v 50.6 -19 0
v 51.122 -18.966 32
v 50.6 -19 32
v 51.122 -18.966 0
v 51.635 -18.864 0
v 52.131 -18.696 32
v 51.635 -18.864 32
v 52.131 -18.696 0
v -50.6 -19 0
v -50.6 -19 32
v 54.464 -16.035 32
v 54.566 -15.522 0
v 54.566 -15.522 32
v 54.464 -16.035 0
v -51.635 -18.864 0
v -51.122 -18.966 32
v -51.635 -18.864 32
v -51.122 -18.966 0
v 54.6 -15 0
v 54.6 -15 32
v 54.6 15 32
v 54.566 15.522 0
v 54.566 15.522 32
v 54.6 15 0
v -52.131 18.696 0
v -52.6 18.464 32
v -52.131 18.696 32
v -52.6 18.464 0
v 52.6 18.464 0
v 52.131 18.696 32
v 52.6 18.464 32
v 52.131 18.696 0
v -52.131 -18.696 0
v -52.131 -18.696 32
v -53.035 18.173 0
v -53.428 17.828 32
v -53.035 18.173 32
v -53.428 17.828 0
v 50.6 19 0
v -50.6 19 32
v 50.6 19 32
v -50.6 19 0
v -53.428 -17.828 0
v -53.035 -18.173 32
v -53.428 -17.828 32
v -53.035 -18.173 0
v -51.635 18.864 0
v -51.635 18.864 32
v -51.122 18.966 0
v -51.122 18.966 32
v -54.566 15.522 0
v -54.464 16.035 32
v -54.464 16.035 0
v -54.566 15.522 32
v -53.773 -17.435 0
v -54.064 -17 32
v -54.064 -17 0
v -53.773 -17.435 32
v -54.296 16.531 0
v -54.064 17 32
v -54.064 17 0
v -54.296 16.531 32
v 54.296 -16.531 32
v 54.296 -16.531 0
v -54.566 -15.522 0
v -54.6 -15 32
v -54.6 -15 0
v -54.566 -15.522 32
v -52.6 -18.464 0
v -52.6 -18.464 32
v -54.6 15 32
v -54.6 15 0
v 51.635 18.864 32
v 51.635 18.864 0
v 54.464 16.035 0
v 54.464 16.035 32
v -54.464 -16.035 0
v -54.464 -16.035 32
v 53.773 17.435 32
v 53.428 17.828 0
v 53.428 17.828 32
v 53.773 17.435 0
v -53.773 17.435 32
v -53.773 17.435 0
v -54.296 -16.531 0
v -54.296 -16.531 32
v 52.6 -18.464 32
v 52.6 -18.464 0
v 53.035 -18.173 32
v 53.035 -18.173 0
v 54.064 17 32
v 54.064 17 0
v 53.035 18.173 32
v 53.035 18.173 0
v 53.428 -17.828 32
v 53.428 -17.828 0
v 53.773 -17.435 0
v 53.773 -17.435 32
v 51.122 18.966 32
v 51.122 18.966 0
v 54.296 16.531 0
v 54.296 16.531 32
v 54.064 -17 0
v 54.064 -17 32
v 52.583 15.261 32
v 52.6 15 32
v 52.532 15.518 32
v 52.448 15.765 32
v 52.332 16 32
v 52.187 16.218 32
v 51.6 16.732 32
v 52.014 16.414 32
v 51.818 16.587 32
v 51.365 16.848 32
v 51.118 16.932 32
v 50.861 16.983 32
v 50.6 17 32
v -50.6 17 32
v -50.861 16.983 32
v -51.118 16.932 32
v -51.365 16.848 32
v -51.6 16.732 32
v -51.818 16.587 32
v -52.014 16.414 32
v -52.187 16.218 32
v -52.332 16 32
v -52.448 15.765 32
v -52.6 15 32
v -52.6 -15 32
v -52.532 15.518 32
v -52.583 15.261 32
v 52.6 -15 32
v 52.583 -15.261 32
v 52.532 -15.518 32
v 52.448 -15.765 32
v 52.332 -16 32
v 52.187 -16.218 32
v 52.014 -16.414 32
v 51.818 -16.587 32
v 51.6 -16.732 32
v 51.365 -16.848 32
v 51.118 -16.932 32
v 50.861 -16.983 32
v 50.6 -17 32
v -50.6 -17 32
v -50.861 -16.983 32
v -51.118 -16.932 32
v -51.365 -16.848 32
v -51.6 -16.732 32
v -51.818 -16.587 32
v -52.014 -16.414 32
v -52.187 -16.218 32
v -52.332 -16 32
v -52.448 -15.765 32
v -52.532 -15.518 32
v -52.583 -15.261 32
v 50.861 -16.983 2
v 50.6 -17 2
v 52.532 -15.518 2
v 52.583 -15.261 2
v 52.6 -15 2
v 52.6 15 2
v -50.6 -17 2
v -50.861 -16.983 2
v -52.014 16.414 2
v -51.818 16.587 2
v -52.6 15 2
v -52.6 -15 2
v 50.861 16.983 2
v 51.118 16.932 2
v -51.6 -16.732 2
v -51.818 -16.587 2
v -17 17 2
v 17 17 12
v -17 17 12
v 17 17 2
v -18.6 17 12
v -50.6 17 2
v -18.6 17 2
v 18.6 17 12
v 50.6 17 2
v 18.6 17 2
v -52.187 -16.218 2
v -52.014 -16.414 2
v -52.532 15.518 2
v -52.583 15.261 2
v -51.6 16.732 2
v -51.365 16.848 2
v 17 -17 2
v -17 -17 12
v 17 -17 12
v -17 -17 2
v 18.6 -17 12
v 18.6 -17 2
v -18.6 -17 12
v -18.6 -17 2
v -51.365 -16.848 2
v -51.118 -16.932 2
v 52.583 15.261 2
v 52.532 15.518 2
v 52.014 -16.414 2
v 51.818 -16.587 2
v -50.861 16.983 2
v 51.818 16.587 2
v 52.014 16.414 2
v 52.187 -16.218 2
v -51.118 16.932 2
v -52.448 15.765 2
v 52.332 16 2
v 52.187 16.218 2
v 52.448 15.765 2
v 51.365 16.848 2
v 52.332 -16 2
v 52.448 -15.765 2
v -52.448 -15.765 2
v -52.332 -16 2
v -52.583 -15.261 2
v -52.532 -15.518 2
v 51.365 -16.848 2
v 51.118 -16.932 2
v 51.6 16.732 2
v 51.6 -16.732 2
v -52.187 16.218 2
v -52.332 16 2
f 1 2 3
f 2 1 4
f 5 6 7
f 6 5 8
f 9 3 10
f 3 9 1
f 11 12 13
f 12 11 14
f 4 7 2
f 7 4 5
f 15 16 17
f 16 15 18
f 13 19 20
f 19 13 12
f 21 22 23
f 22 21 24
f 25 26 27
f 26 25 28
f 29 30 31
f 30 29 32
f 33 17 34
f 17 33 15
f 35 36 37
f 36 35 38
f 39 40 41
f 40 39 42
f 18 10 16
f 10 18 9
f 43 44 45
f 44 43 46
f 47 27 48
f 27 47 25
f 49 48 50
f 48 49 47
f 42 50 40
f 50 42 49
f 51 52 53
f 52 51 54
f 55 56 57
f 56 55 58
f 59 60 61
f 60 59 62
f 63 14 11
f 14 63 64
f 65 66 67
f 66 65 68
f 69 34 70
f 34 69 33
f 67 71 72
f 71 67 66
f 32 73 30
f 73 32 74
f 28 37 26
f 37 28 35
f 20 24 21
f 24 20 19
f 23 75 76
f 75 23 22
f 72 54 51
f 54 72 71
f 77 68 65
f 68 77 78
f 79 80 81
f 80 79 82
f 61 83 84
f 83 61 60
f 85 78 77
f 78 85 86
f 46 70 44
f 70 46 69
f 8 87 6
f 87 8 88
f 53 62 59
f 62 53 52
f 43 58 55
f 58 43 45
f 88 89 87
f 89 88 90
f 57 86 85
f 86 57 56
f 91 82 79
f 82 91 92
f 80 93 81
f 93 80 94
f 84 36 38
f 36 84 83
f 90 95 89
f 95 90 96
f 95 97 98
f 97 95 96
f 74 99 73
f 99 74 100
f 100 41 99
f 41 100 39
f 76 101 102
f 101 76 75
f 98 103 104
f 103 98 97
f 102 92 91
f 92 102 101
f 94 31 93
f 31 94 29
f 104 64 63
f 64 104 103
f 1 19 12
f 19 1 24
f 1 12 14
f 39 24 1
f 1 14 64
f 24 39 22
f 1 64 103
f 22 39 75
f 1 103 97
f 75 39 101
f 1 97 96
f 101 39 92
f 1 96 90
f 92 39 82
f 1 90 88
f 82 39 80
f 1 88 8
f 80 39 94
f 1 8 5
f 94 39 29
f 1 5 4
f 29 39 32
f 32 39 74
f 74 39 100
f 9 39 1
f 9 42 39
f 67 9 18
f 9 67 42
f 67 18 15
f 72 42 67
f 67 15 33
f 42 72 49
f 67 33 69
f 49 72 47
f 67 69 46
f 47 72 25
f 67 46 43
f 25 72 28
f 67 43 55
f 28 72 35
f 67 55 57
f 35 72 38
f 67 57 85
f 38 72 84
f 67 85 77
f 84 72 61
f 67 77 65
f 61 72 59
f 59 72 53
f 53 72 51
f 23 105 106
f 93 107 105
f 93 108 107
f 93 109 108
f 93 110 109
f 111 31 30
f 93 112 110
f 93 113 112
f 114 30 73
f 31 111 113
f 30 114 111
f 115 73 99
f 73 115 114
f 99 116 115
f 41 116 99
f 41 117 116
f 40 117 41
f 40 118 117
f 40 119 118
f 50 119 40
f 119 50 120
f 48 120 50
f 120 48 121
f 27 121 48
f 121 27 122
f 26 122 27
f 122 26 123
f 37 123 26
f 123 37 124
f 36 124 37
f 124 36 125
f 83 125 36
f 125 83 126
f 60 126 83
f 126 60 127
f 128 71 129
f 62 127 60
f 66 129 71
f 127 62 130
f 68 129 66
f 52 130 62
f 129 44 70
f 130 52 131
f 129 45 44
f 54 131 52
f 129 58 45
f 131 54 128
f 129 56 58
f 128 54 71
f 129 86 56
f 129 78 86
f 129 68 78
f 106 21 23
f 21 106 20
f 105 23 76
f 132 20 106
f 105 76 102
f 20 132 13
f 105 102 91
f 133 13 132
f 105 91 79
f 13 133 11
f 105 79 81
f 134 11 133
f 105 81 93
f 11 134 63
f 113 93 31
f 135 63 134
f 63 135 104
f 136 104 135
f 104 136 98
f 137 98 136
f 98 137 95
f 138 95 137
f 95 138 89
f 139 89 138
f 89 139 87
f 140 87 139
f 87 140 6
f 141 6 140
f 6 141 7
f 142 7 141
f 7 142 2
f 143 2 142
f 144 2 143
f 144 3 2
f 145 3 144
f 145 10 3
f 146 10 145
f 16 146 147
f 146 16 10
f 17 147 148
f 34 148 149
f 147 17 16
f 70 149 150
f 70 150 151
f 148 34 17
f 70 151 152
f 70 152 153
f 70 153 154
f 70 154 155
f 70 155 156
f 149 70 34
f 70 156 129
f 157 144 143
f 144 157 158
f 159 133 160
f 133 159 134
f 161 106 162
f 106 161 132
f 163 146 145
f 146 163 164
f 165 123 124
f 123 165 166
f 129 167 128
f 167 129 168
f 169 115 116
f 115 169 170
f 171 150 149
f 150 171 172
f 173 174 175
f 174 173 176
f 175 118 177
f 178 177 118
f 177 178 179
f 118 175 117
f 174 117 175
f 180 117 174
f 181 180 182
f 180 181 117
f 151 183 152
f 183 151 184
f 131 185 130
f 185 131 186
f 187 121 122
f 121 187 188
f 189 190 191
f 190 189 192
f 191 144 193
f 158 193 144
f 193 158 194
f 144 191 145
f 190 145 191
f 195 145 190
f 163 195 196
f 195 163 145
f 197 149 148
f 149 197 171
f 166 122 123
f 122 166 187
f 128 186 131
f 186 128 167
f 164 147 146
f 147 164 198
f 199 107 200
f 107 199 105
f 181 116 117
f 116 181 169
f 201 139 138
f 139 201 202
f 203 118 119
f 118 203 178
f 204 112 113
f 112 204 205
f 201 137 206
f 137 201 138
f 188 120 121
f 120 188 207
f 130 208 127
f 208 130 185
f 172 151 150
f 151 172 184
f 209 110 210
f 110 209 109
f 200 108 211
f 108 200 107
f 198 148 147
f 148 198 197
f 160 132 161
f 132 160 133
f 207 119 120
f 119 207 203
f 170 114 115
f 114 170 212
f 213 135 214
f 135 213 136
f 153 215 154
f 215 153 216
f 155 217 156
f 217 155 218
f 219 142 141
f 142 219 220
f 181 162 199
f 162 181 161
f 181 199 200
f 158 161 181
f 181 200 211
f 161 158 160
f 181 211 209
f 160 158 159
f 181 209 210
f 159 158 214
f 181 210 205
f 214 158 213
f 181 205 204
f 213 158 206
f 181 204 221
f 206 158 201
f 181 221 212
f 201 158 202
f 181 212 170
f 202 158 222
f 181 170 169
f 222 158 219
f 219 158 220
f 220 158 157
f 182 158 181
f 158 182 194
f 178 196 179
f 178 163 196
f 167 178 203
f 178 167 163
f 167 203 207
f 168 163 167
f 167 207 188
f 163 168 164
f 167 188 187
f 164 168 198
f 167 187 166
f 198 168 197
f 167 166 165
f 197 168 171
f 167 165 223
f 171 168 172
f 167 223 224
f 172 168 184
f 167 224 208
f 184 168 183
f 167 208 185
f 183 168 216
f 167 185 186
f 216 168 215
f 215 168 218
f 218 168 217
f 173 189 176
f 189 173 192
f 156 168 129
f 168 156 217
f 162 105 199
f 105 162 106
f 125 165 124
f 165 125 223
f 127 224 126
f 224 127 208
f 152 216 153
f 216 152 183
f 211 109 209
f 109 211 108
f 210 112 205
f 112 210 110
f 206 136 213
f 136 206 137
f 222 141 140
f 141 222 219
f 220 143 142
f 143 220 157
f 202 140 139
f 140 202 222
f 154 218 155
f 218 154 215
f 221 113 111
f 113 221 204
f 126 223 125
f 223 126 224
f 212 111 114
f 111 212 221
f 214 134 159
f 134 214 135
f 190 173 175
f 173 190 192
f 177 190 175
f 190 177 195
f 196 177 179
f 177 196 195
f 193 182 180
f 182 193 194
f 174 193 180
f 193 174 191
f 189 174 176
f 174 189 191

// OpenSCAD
// Pomona seed germination box V1: a row of cells (default 3), one 22 x 22 x 25 mm coco/sponge
// plug per cell, and a vented lid over all cells.
// Licence: Apache-2.0 (same as the Pomona repository).
//
// Each plug sits directly on the flat floor of its cell. Low dividers keep each cell's water
// separate: pour about 3 mm of water per cell and the plug wicks it up without being submerged.
// The lid plugs into the opening and has four vent holes over each cell; when the seedlings
// grow, lift the lid, prop it ajar, then remove it.
//
// Modelled in PRINT orientation, no supports:
//   box: floor on the bed, opening up.  lid: plate on the bed, plug pointing up.
//
// Render:  openscad -o box.stl -D 'part="box"' pomona_seed_box.scad
// Parts:   box, lid, plate (box + lid centred on a 180 mm A1 mini bed),
//          test_sponge (the plugs, to check the fit; do not print it)

$fn = 48;
part = "box";

// ---- size (mm) --------------------------------------------------------------------------
CELLS = 3;               // plugs side by side (up to 4 fit the A1 mini bed)
CELL = 34.0;             // inside width of one cell (square)
BOX_H = 32.0;            // body height; closed height = BOX_H + LID_T
WALL = 2.0;
FLOOR = 2.0;
DIV_T = 1.6;             // divider thickness
DIV_H = 10.0;            // divider height above the floor: separates water, stays below the lid plug
CORNER_R = 4.0;          // outer corner radius

// ---- sponge and water -------------------------------------------------------------------
SPONGE_W = 22.0;         // plug width and depth
SPONGE_H = 25.0;         // plug height

WATER_DEPTH = 3.0;       // suggested water depth per cell (not modelled)

// ---- lid ----------------------------------------------------------------------------------
LID_T = 2.0;
PLUG_CLEAR = 0.5;        // total clearance between plug and opening (printer dependent)
PLUG_H = 4.0;
PLUG_WALL = 1.6;
VENT_D = 2.5;
VENT_OFFSET = 8.0;       // four vents per cell at +-this from the cell centre, on the axes
TAB = [14, 6];           // lift tab beyond the lid edge: width, reach

IN = [CELLS * CELL + (CELLS - 1) * DIV_T, CELL];
OUT = IN + [2 * WALL, 2 * WALL];
function cell_x(i) = -IN[0] / 2 + CELL / 2 + i * (CELL + DIV_T);

assert(CELLS >= 1, "need at least one cell");
assert(OUT[0] <= 175, "too many cells for the A1 mini bed (180 mm)");
assert(BOX_H >= FLOOR + SPONGE_H + 4, "leave at least 4 mm above the plug for the seed");
assert(CELL > SPONGE_W + 2, "plug does not fit in a cell");
assert(DIV_H < BOX_H - PLUG_H - FLOOR, "dividers would hit the lid plug");

module rrect(size, r) {
    offset(r) square(size - [2 * r, 2 * r], center = true);
}
module rbox(size, r, h) {
    linear_extrude(h) rrect(size, r);
}

module box() {
    difference() {
        rbox(OUT, CORNER_R, BOX_H);
        translate([0, 0, FLOOR]) rbox(IN, CORNER_R - WALL, BOX_H);
    }
    for (i = [1 : CELLS - 1])
        translate([cell_x(i) - CELL / 2 - DIV_T, -IN[1] / 2 - 0.01, FLOOR - 0.01])
            cube([DIV_T, IN[1] + 0.02, DIV_H + 0.01]);
}

module lid() {
    plug = IN - [PLUG_CLEAR, PLUG_CLEAR];
    // plate
    difference() {
        union() {
            rbox(OUT, CORNER_R, LID_T);
            // lift tab on -y
            translate([-TAB[0] / 2, -OUT[1] / 2 - TAB[1], 0]) cube([TAB[0], TAB[1] + 2, LID_T]);
        }
        for (i = [0 : CELLS - 1], a = [0, 90, 180, 270])
            translate([cell_x(i), 0, -0.1]) rotate(a) translate([VENT_OFFSET, 0, 0])
                cylinder(d = VENT_D, h = LID_T + 0.2);
    }
    // plug ring (hollow, drops into the opening)
    translate([0, 0, LID_T - 0.01]) difference() {
        rbox(plug, CORNER_R - WALL, PLUG_H + 0.01);
        translate([0, 0, -0.1])
            rbox(plug - [2 * PLUG_WALL, 2 * PLUG_WALL], max(CORNER_R - WALL - PLUG_WALL, 0.5), PLUG_H + 0.3);
    }
}

module test_sponge() {
    for (i = [0 : CELLS - 1])
        translate([cell_x(i) - SPONGE_W / 2, -SPONGE_W / 2, FLOOR]) cube([SPONGE_W, SPONGE_W, SPONGE_H]);
}

module plate() {
    translate([90, 55, 0]) box();
    translate([90, 125, 0]) lid();
}

if (part == "box") box();
else if (part == "plate") plate();
else if (part == "lid") lid();
else if (part == "test_sponge") test_sponge();
